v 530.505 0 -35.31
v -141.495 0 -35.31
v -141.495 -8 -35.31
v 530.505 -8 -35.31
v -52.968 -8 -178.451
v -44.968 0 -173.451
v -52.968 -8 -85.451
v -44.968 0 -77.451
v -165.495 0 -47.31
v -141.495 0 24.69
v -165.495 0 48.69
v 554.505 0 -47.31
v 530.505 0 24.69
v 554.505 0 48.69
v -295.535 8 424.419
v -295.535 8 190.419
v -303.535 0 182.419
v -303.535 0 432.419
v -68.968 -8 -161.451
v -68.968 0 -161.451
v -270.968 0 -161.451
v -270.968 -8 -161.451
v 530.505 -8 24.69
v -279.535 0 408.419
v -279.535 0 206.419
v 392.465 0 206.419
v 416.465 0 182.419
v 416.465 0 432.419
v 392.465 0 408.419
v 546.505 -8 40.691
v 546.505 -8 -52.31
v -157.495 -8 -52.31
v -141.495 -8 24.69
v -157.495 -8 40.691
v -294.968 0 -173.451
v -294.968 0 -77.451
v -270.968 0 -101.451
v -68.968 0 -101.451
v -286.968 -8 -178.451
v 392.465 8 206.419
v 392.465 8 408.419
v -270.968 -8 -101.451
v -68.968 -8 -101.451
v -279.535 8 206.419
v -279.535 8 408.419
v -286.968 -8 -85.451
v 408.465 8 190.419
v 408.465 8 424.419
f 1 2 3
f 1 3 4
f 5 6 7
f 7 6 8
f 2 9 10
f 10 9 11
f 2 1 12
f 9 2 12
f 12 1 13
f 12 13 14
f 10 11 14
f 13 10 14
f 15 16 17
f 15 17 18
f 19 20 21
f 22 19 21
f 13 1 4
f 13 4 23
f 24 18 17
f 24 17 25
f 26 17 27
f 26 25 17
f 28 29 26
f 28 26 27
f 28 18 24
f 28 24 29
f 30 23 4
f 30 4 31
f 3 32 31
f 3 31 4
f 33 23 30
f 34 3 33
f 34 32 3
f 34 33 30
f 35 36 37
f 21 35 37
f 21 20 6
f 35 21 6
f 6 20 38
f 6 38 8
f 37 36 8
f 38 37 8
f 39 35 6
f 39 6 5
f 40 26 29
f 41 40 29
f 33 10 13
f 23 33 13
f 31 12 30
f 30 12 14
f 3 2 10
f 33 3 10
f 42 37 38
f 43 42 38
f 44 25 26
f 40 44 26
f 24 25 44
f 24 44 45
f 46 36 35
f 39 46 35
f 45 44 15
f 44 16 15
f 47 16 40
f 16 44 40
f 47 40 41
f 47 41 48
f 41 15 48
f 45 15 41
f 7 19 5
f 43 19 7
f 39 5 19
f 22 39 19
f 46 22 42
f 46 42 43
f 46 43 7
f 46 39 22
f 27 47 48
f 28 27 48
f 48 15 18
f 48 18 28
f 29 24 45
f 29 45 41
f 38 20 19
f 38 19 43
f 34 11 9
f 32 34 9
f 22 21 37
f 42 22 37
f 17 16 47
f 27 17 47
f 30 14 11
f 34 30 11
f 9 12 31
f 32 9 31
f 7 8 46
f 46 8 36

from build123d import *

# Parameters (mm, degrees)
F0_W      = 672
F0_H      = 24
F0_W_2    = 24
F0_H_2    = 60
F0_H_3    = 12
F1_DEPTH  = 8
F3_DEPTH  = 720
F4_SIZE   = 7.99999
F5_W      = 202
F5_H      = 24
F5_W_2    = 24
F5_H_2    = 60
F5_H_3    = 12
F6_DEPTH  = 8
F8_DEPTH  = 250
F9_SIZE   = 7.99999
F10_W     = 720
F10_H     = 250
F11_DEPTH = 8
F12_SIZE  = 7.99999
F13_W     = 672
F13_H     = 202
F14_DEPTH = 25


# Not quite as in the source:
# - a fillet or chamfer is up to 0.001 mm smaller than in the source, because OpenCascade refuses the exact size


with BuildPart() as f1:
    # F0 (on Front) → F1 (new body)
    with BuildSketch(Plane.XZ):
        with Locations((194.5052774136, 36.6904993206)):
            Rectangle(F0_W, F0_H)
        with Locations((-153.4947225864, 36.6904993206)):
            Rectangle(F0_W_2, F0_H)
        with Locations((-153.4947225864, -5.3095006794)):
            Rectangle(F0_W_2, F0_H_2)
        with Locations((-153.4947225864, -41.3095006794)):
            Rectangle(F0_W_2, F0_H_3)
        with Locations((194.5052774136, -41.3095006794)):
            Rectangle(F0_W, F0_H_3)
        with Locations((542.5052774136, -5.3095006794)):
            Rectangle(F0_W_2, F0_H_2)
        with Locations((542.5052774136, 36.6904993206)):
            Rectangle(F0_W_2, F0_H)
        with Locations((542.5052774136, -41.3095006794)):
            Rectangle(F0_W_2, F0_H_3)
    extrude(amount=F1_DEPTH)

    # F2 (on face) → F3 (join)
    with BuildSketch(Plane(origin=(-165.4947225864, 0, 0), x_dir=(0, -1, 0), z_dir=(-1, 0, 0))):
        Polygon((8, -52.3095006794), (8, -47.3095006794), (0, -47.3095006794), align=None)
    extrude(amount=-F3_DEPTH)

    # F4 (size 8 in the source; OpenCascade refuses exactly that, so slightly less here)
    f4_edges = [f1.edges().sort_by_distance(p)[0] for p in [
        (554.505277, -8, -1.809501),
        (194.505277, -8, 48.690499),
        (-165.494723, -8, -1.809501),
    ]]
    chamfer(f4_edges, length=F4_SIZE)


with BuildPart() as f6:
    # F5 (on Front) → F6 (new body)
    with BuildSketch(Plane.XZ):
        with Locations((-169.9683964583, -89.4514269531)):
            Rectangle(F5_W, F5_H)
        with Locations((-282.9683964583, -89.4514269531)):
            Rectangle(F5_W_2, F5_H)
        with Locations((-282.9683964583, -131.4514269531)):
            Rectangle(F5_W_2, F5_H_2)
        with Locations((-282.9683964583, -167.4514269531)):
            Rectangle(F5_W_2, F5_H_3)
        with Locations((-169.9683964583, -167.4514269531)):
            Rectangle(F5_W, F5_H_3)
        with Locations((-56.9683964583, -167.4514269531)):
            Rectangle(F5_W_2, F5_H_3)
        with Locations((-56.9683964583, -131.4514269531)):
            Rectangle(F5_W_2, F5_H_2)
        with Locations((-56.9683964583, -89.4514269531)):
            Rectangle(F5_W_2, F5_H)
    extrude(amount=F6_DEPTH)

    # F7 (on face) → F8 (join)
    with BuildSketch(Plane(origin=(-294.9683964583, 0, 0), x_dir=(0, -1, 0), z_dir=(-1, 0, 0))):
        Polygon((8, -178.4514269531), (8, -173.4514269531), (0, -173.4514269531), align=None)
    extrude(amount=-F8_DEPTH)

    # F9 (size 8 in the source; OpenCascade refuses exactly that, so slightly less here)
    f9_edges = [f6.edges().sort_by_distance(p)[0] for p in [
        (-169.968396, -8, -77.451427),
        (-294.968396, -8, -127.951427),
        (-44.968396, -8, -127.951427),
    ]]
    chamfer(f9_edges, length=F9_SIZE)


with BuildPart() as f11:
    # F10 (on Front) → F11 (new body)
    with BuildSketch(Plane.XZ):
        with Locations((56.4652234316, 307.4194252866)):
            Rectangle(F10_W, F10_H)
    extrude(amount=-F11_DEPTH)

    # F12 (size 8 in the source; OpenCascade refuses exactly that, so slightly less here)
    f12_edges = [f11.edges().sort_by_distance(p)[0] for p in [
        (56.465223, 8, 182.419425),
        (416.465223, 8, 307.419425),
        (56.465223, 8, 432.419425),
        (-303.534777, 8, 307.419425),
    ]]
    chamfer(f12_edges, length=F12_SIZE)

    # F13 (on face) → F14 (cut)
    with BuildSketch(Plane.XZ):
        with Locations((56.4652234316, 307.4194252866)):
            Rectangle(F13_W, F13_H)
    extrude(amount=-F14_DEPTH, mode=Mode.SUBTRACT)


solid = Compound([f1.part, f6.part, f11.part])
